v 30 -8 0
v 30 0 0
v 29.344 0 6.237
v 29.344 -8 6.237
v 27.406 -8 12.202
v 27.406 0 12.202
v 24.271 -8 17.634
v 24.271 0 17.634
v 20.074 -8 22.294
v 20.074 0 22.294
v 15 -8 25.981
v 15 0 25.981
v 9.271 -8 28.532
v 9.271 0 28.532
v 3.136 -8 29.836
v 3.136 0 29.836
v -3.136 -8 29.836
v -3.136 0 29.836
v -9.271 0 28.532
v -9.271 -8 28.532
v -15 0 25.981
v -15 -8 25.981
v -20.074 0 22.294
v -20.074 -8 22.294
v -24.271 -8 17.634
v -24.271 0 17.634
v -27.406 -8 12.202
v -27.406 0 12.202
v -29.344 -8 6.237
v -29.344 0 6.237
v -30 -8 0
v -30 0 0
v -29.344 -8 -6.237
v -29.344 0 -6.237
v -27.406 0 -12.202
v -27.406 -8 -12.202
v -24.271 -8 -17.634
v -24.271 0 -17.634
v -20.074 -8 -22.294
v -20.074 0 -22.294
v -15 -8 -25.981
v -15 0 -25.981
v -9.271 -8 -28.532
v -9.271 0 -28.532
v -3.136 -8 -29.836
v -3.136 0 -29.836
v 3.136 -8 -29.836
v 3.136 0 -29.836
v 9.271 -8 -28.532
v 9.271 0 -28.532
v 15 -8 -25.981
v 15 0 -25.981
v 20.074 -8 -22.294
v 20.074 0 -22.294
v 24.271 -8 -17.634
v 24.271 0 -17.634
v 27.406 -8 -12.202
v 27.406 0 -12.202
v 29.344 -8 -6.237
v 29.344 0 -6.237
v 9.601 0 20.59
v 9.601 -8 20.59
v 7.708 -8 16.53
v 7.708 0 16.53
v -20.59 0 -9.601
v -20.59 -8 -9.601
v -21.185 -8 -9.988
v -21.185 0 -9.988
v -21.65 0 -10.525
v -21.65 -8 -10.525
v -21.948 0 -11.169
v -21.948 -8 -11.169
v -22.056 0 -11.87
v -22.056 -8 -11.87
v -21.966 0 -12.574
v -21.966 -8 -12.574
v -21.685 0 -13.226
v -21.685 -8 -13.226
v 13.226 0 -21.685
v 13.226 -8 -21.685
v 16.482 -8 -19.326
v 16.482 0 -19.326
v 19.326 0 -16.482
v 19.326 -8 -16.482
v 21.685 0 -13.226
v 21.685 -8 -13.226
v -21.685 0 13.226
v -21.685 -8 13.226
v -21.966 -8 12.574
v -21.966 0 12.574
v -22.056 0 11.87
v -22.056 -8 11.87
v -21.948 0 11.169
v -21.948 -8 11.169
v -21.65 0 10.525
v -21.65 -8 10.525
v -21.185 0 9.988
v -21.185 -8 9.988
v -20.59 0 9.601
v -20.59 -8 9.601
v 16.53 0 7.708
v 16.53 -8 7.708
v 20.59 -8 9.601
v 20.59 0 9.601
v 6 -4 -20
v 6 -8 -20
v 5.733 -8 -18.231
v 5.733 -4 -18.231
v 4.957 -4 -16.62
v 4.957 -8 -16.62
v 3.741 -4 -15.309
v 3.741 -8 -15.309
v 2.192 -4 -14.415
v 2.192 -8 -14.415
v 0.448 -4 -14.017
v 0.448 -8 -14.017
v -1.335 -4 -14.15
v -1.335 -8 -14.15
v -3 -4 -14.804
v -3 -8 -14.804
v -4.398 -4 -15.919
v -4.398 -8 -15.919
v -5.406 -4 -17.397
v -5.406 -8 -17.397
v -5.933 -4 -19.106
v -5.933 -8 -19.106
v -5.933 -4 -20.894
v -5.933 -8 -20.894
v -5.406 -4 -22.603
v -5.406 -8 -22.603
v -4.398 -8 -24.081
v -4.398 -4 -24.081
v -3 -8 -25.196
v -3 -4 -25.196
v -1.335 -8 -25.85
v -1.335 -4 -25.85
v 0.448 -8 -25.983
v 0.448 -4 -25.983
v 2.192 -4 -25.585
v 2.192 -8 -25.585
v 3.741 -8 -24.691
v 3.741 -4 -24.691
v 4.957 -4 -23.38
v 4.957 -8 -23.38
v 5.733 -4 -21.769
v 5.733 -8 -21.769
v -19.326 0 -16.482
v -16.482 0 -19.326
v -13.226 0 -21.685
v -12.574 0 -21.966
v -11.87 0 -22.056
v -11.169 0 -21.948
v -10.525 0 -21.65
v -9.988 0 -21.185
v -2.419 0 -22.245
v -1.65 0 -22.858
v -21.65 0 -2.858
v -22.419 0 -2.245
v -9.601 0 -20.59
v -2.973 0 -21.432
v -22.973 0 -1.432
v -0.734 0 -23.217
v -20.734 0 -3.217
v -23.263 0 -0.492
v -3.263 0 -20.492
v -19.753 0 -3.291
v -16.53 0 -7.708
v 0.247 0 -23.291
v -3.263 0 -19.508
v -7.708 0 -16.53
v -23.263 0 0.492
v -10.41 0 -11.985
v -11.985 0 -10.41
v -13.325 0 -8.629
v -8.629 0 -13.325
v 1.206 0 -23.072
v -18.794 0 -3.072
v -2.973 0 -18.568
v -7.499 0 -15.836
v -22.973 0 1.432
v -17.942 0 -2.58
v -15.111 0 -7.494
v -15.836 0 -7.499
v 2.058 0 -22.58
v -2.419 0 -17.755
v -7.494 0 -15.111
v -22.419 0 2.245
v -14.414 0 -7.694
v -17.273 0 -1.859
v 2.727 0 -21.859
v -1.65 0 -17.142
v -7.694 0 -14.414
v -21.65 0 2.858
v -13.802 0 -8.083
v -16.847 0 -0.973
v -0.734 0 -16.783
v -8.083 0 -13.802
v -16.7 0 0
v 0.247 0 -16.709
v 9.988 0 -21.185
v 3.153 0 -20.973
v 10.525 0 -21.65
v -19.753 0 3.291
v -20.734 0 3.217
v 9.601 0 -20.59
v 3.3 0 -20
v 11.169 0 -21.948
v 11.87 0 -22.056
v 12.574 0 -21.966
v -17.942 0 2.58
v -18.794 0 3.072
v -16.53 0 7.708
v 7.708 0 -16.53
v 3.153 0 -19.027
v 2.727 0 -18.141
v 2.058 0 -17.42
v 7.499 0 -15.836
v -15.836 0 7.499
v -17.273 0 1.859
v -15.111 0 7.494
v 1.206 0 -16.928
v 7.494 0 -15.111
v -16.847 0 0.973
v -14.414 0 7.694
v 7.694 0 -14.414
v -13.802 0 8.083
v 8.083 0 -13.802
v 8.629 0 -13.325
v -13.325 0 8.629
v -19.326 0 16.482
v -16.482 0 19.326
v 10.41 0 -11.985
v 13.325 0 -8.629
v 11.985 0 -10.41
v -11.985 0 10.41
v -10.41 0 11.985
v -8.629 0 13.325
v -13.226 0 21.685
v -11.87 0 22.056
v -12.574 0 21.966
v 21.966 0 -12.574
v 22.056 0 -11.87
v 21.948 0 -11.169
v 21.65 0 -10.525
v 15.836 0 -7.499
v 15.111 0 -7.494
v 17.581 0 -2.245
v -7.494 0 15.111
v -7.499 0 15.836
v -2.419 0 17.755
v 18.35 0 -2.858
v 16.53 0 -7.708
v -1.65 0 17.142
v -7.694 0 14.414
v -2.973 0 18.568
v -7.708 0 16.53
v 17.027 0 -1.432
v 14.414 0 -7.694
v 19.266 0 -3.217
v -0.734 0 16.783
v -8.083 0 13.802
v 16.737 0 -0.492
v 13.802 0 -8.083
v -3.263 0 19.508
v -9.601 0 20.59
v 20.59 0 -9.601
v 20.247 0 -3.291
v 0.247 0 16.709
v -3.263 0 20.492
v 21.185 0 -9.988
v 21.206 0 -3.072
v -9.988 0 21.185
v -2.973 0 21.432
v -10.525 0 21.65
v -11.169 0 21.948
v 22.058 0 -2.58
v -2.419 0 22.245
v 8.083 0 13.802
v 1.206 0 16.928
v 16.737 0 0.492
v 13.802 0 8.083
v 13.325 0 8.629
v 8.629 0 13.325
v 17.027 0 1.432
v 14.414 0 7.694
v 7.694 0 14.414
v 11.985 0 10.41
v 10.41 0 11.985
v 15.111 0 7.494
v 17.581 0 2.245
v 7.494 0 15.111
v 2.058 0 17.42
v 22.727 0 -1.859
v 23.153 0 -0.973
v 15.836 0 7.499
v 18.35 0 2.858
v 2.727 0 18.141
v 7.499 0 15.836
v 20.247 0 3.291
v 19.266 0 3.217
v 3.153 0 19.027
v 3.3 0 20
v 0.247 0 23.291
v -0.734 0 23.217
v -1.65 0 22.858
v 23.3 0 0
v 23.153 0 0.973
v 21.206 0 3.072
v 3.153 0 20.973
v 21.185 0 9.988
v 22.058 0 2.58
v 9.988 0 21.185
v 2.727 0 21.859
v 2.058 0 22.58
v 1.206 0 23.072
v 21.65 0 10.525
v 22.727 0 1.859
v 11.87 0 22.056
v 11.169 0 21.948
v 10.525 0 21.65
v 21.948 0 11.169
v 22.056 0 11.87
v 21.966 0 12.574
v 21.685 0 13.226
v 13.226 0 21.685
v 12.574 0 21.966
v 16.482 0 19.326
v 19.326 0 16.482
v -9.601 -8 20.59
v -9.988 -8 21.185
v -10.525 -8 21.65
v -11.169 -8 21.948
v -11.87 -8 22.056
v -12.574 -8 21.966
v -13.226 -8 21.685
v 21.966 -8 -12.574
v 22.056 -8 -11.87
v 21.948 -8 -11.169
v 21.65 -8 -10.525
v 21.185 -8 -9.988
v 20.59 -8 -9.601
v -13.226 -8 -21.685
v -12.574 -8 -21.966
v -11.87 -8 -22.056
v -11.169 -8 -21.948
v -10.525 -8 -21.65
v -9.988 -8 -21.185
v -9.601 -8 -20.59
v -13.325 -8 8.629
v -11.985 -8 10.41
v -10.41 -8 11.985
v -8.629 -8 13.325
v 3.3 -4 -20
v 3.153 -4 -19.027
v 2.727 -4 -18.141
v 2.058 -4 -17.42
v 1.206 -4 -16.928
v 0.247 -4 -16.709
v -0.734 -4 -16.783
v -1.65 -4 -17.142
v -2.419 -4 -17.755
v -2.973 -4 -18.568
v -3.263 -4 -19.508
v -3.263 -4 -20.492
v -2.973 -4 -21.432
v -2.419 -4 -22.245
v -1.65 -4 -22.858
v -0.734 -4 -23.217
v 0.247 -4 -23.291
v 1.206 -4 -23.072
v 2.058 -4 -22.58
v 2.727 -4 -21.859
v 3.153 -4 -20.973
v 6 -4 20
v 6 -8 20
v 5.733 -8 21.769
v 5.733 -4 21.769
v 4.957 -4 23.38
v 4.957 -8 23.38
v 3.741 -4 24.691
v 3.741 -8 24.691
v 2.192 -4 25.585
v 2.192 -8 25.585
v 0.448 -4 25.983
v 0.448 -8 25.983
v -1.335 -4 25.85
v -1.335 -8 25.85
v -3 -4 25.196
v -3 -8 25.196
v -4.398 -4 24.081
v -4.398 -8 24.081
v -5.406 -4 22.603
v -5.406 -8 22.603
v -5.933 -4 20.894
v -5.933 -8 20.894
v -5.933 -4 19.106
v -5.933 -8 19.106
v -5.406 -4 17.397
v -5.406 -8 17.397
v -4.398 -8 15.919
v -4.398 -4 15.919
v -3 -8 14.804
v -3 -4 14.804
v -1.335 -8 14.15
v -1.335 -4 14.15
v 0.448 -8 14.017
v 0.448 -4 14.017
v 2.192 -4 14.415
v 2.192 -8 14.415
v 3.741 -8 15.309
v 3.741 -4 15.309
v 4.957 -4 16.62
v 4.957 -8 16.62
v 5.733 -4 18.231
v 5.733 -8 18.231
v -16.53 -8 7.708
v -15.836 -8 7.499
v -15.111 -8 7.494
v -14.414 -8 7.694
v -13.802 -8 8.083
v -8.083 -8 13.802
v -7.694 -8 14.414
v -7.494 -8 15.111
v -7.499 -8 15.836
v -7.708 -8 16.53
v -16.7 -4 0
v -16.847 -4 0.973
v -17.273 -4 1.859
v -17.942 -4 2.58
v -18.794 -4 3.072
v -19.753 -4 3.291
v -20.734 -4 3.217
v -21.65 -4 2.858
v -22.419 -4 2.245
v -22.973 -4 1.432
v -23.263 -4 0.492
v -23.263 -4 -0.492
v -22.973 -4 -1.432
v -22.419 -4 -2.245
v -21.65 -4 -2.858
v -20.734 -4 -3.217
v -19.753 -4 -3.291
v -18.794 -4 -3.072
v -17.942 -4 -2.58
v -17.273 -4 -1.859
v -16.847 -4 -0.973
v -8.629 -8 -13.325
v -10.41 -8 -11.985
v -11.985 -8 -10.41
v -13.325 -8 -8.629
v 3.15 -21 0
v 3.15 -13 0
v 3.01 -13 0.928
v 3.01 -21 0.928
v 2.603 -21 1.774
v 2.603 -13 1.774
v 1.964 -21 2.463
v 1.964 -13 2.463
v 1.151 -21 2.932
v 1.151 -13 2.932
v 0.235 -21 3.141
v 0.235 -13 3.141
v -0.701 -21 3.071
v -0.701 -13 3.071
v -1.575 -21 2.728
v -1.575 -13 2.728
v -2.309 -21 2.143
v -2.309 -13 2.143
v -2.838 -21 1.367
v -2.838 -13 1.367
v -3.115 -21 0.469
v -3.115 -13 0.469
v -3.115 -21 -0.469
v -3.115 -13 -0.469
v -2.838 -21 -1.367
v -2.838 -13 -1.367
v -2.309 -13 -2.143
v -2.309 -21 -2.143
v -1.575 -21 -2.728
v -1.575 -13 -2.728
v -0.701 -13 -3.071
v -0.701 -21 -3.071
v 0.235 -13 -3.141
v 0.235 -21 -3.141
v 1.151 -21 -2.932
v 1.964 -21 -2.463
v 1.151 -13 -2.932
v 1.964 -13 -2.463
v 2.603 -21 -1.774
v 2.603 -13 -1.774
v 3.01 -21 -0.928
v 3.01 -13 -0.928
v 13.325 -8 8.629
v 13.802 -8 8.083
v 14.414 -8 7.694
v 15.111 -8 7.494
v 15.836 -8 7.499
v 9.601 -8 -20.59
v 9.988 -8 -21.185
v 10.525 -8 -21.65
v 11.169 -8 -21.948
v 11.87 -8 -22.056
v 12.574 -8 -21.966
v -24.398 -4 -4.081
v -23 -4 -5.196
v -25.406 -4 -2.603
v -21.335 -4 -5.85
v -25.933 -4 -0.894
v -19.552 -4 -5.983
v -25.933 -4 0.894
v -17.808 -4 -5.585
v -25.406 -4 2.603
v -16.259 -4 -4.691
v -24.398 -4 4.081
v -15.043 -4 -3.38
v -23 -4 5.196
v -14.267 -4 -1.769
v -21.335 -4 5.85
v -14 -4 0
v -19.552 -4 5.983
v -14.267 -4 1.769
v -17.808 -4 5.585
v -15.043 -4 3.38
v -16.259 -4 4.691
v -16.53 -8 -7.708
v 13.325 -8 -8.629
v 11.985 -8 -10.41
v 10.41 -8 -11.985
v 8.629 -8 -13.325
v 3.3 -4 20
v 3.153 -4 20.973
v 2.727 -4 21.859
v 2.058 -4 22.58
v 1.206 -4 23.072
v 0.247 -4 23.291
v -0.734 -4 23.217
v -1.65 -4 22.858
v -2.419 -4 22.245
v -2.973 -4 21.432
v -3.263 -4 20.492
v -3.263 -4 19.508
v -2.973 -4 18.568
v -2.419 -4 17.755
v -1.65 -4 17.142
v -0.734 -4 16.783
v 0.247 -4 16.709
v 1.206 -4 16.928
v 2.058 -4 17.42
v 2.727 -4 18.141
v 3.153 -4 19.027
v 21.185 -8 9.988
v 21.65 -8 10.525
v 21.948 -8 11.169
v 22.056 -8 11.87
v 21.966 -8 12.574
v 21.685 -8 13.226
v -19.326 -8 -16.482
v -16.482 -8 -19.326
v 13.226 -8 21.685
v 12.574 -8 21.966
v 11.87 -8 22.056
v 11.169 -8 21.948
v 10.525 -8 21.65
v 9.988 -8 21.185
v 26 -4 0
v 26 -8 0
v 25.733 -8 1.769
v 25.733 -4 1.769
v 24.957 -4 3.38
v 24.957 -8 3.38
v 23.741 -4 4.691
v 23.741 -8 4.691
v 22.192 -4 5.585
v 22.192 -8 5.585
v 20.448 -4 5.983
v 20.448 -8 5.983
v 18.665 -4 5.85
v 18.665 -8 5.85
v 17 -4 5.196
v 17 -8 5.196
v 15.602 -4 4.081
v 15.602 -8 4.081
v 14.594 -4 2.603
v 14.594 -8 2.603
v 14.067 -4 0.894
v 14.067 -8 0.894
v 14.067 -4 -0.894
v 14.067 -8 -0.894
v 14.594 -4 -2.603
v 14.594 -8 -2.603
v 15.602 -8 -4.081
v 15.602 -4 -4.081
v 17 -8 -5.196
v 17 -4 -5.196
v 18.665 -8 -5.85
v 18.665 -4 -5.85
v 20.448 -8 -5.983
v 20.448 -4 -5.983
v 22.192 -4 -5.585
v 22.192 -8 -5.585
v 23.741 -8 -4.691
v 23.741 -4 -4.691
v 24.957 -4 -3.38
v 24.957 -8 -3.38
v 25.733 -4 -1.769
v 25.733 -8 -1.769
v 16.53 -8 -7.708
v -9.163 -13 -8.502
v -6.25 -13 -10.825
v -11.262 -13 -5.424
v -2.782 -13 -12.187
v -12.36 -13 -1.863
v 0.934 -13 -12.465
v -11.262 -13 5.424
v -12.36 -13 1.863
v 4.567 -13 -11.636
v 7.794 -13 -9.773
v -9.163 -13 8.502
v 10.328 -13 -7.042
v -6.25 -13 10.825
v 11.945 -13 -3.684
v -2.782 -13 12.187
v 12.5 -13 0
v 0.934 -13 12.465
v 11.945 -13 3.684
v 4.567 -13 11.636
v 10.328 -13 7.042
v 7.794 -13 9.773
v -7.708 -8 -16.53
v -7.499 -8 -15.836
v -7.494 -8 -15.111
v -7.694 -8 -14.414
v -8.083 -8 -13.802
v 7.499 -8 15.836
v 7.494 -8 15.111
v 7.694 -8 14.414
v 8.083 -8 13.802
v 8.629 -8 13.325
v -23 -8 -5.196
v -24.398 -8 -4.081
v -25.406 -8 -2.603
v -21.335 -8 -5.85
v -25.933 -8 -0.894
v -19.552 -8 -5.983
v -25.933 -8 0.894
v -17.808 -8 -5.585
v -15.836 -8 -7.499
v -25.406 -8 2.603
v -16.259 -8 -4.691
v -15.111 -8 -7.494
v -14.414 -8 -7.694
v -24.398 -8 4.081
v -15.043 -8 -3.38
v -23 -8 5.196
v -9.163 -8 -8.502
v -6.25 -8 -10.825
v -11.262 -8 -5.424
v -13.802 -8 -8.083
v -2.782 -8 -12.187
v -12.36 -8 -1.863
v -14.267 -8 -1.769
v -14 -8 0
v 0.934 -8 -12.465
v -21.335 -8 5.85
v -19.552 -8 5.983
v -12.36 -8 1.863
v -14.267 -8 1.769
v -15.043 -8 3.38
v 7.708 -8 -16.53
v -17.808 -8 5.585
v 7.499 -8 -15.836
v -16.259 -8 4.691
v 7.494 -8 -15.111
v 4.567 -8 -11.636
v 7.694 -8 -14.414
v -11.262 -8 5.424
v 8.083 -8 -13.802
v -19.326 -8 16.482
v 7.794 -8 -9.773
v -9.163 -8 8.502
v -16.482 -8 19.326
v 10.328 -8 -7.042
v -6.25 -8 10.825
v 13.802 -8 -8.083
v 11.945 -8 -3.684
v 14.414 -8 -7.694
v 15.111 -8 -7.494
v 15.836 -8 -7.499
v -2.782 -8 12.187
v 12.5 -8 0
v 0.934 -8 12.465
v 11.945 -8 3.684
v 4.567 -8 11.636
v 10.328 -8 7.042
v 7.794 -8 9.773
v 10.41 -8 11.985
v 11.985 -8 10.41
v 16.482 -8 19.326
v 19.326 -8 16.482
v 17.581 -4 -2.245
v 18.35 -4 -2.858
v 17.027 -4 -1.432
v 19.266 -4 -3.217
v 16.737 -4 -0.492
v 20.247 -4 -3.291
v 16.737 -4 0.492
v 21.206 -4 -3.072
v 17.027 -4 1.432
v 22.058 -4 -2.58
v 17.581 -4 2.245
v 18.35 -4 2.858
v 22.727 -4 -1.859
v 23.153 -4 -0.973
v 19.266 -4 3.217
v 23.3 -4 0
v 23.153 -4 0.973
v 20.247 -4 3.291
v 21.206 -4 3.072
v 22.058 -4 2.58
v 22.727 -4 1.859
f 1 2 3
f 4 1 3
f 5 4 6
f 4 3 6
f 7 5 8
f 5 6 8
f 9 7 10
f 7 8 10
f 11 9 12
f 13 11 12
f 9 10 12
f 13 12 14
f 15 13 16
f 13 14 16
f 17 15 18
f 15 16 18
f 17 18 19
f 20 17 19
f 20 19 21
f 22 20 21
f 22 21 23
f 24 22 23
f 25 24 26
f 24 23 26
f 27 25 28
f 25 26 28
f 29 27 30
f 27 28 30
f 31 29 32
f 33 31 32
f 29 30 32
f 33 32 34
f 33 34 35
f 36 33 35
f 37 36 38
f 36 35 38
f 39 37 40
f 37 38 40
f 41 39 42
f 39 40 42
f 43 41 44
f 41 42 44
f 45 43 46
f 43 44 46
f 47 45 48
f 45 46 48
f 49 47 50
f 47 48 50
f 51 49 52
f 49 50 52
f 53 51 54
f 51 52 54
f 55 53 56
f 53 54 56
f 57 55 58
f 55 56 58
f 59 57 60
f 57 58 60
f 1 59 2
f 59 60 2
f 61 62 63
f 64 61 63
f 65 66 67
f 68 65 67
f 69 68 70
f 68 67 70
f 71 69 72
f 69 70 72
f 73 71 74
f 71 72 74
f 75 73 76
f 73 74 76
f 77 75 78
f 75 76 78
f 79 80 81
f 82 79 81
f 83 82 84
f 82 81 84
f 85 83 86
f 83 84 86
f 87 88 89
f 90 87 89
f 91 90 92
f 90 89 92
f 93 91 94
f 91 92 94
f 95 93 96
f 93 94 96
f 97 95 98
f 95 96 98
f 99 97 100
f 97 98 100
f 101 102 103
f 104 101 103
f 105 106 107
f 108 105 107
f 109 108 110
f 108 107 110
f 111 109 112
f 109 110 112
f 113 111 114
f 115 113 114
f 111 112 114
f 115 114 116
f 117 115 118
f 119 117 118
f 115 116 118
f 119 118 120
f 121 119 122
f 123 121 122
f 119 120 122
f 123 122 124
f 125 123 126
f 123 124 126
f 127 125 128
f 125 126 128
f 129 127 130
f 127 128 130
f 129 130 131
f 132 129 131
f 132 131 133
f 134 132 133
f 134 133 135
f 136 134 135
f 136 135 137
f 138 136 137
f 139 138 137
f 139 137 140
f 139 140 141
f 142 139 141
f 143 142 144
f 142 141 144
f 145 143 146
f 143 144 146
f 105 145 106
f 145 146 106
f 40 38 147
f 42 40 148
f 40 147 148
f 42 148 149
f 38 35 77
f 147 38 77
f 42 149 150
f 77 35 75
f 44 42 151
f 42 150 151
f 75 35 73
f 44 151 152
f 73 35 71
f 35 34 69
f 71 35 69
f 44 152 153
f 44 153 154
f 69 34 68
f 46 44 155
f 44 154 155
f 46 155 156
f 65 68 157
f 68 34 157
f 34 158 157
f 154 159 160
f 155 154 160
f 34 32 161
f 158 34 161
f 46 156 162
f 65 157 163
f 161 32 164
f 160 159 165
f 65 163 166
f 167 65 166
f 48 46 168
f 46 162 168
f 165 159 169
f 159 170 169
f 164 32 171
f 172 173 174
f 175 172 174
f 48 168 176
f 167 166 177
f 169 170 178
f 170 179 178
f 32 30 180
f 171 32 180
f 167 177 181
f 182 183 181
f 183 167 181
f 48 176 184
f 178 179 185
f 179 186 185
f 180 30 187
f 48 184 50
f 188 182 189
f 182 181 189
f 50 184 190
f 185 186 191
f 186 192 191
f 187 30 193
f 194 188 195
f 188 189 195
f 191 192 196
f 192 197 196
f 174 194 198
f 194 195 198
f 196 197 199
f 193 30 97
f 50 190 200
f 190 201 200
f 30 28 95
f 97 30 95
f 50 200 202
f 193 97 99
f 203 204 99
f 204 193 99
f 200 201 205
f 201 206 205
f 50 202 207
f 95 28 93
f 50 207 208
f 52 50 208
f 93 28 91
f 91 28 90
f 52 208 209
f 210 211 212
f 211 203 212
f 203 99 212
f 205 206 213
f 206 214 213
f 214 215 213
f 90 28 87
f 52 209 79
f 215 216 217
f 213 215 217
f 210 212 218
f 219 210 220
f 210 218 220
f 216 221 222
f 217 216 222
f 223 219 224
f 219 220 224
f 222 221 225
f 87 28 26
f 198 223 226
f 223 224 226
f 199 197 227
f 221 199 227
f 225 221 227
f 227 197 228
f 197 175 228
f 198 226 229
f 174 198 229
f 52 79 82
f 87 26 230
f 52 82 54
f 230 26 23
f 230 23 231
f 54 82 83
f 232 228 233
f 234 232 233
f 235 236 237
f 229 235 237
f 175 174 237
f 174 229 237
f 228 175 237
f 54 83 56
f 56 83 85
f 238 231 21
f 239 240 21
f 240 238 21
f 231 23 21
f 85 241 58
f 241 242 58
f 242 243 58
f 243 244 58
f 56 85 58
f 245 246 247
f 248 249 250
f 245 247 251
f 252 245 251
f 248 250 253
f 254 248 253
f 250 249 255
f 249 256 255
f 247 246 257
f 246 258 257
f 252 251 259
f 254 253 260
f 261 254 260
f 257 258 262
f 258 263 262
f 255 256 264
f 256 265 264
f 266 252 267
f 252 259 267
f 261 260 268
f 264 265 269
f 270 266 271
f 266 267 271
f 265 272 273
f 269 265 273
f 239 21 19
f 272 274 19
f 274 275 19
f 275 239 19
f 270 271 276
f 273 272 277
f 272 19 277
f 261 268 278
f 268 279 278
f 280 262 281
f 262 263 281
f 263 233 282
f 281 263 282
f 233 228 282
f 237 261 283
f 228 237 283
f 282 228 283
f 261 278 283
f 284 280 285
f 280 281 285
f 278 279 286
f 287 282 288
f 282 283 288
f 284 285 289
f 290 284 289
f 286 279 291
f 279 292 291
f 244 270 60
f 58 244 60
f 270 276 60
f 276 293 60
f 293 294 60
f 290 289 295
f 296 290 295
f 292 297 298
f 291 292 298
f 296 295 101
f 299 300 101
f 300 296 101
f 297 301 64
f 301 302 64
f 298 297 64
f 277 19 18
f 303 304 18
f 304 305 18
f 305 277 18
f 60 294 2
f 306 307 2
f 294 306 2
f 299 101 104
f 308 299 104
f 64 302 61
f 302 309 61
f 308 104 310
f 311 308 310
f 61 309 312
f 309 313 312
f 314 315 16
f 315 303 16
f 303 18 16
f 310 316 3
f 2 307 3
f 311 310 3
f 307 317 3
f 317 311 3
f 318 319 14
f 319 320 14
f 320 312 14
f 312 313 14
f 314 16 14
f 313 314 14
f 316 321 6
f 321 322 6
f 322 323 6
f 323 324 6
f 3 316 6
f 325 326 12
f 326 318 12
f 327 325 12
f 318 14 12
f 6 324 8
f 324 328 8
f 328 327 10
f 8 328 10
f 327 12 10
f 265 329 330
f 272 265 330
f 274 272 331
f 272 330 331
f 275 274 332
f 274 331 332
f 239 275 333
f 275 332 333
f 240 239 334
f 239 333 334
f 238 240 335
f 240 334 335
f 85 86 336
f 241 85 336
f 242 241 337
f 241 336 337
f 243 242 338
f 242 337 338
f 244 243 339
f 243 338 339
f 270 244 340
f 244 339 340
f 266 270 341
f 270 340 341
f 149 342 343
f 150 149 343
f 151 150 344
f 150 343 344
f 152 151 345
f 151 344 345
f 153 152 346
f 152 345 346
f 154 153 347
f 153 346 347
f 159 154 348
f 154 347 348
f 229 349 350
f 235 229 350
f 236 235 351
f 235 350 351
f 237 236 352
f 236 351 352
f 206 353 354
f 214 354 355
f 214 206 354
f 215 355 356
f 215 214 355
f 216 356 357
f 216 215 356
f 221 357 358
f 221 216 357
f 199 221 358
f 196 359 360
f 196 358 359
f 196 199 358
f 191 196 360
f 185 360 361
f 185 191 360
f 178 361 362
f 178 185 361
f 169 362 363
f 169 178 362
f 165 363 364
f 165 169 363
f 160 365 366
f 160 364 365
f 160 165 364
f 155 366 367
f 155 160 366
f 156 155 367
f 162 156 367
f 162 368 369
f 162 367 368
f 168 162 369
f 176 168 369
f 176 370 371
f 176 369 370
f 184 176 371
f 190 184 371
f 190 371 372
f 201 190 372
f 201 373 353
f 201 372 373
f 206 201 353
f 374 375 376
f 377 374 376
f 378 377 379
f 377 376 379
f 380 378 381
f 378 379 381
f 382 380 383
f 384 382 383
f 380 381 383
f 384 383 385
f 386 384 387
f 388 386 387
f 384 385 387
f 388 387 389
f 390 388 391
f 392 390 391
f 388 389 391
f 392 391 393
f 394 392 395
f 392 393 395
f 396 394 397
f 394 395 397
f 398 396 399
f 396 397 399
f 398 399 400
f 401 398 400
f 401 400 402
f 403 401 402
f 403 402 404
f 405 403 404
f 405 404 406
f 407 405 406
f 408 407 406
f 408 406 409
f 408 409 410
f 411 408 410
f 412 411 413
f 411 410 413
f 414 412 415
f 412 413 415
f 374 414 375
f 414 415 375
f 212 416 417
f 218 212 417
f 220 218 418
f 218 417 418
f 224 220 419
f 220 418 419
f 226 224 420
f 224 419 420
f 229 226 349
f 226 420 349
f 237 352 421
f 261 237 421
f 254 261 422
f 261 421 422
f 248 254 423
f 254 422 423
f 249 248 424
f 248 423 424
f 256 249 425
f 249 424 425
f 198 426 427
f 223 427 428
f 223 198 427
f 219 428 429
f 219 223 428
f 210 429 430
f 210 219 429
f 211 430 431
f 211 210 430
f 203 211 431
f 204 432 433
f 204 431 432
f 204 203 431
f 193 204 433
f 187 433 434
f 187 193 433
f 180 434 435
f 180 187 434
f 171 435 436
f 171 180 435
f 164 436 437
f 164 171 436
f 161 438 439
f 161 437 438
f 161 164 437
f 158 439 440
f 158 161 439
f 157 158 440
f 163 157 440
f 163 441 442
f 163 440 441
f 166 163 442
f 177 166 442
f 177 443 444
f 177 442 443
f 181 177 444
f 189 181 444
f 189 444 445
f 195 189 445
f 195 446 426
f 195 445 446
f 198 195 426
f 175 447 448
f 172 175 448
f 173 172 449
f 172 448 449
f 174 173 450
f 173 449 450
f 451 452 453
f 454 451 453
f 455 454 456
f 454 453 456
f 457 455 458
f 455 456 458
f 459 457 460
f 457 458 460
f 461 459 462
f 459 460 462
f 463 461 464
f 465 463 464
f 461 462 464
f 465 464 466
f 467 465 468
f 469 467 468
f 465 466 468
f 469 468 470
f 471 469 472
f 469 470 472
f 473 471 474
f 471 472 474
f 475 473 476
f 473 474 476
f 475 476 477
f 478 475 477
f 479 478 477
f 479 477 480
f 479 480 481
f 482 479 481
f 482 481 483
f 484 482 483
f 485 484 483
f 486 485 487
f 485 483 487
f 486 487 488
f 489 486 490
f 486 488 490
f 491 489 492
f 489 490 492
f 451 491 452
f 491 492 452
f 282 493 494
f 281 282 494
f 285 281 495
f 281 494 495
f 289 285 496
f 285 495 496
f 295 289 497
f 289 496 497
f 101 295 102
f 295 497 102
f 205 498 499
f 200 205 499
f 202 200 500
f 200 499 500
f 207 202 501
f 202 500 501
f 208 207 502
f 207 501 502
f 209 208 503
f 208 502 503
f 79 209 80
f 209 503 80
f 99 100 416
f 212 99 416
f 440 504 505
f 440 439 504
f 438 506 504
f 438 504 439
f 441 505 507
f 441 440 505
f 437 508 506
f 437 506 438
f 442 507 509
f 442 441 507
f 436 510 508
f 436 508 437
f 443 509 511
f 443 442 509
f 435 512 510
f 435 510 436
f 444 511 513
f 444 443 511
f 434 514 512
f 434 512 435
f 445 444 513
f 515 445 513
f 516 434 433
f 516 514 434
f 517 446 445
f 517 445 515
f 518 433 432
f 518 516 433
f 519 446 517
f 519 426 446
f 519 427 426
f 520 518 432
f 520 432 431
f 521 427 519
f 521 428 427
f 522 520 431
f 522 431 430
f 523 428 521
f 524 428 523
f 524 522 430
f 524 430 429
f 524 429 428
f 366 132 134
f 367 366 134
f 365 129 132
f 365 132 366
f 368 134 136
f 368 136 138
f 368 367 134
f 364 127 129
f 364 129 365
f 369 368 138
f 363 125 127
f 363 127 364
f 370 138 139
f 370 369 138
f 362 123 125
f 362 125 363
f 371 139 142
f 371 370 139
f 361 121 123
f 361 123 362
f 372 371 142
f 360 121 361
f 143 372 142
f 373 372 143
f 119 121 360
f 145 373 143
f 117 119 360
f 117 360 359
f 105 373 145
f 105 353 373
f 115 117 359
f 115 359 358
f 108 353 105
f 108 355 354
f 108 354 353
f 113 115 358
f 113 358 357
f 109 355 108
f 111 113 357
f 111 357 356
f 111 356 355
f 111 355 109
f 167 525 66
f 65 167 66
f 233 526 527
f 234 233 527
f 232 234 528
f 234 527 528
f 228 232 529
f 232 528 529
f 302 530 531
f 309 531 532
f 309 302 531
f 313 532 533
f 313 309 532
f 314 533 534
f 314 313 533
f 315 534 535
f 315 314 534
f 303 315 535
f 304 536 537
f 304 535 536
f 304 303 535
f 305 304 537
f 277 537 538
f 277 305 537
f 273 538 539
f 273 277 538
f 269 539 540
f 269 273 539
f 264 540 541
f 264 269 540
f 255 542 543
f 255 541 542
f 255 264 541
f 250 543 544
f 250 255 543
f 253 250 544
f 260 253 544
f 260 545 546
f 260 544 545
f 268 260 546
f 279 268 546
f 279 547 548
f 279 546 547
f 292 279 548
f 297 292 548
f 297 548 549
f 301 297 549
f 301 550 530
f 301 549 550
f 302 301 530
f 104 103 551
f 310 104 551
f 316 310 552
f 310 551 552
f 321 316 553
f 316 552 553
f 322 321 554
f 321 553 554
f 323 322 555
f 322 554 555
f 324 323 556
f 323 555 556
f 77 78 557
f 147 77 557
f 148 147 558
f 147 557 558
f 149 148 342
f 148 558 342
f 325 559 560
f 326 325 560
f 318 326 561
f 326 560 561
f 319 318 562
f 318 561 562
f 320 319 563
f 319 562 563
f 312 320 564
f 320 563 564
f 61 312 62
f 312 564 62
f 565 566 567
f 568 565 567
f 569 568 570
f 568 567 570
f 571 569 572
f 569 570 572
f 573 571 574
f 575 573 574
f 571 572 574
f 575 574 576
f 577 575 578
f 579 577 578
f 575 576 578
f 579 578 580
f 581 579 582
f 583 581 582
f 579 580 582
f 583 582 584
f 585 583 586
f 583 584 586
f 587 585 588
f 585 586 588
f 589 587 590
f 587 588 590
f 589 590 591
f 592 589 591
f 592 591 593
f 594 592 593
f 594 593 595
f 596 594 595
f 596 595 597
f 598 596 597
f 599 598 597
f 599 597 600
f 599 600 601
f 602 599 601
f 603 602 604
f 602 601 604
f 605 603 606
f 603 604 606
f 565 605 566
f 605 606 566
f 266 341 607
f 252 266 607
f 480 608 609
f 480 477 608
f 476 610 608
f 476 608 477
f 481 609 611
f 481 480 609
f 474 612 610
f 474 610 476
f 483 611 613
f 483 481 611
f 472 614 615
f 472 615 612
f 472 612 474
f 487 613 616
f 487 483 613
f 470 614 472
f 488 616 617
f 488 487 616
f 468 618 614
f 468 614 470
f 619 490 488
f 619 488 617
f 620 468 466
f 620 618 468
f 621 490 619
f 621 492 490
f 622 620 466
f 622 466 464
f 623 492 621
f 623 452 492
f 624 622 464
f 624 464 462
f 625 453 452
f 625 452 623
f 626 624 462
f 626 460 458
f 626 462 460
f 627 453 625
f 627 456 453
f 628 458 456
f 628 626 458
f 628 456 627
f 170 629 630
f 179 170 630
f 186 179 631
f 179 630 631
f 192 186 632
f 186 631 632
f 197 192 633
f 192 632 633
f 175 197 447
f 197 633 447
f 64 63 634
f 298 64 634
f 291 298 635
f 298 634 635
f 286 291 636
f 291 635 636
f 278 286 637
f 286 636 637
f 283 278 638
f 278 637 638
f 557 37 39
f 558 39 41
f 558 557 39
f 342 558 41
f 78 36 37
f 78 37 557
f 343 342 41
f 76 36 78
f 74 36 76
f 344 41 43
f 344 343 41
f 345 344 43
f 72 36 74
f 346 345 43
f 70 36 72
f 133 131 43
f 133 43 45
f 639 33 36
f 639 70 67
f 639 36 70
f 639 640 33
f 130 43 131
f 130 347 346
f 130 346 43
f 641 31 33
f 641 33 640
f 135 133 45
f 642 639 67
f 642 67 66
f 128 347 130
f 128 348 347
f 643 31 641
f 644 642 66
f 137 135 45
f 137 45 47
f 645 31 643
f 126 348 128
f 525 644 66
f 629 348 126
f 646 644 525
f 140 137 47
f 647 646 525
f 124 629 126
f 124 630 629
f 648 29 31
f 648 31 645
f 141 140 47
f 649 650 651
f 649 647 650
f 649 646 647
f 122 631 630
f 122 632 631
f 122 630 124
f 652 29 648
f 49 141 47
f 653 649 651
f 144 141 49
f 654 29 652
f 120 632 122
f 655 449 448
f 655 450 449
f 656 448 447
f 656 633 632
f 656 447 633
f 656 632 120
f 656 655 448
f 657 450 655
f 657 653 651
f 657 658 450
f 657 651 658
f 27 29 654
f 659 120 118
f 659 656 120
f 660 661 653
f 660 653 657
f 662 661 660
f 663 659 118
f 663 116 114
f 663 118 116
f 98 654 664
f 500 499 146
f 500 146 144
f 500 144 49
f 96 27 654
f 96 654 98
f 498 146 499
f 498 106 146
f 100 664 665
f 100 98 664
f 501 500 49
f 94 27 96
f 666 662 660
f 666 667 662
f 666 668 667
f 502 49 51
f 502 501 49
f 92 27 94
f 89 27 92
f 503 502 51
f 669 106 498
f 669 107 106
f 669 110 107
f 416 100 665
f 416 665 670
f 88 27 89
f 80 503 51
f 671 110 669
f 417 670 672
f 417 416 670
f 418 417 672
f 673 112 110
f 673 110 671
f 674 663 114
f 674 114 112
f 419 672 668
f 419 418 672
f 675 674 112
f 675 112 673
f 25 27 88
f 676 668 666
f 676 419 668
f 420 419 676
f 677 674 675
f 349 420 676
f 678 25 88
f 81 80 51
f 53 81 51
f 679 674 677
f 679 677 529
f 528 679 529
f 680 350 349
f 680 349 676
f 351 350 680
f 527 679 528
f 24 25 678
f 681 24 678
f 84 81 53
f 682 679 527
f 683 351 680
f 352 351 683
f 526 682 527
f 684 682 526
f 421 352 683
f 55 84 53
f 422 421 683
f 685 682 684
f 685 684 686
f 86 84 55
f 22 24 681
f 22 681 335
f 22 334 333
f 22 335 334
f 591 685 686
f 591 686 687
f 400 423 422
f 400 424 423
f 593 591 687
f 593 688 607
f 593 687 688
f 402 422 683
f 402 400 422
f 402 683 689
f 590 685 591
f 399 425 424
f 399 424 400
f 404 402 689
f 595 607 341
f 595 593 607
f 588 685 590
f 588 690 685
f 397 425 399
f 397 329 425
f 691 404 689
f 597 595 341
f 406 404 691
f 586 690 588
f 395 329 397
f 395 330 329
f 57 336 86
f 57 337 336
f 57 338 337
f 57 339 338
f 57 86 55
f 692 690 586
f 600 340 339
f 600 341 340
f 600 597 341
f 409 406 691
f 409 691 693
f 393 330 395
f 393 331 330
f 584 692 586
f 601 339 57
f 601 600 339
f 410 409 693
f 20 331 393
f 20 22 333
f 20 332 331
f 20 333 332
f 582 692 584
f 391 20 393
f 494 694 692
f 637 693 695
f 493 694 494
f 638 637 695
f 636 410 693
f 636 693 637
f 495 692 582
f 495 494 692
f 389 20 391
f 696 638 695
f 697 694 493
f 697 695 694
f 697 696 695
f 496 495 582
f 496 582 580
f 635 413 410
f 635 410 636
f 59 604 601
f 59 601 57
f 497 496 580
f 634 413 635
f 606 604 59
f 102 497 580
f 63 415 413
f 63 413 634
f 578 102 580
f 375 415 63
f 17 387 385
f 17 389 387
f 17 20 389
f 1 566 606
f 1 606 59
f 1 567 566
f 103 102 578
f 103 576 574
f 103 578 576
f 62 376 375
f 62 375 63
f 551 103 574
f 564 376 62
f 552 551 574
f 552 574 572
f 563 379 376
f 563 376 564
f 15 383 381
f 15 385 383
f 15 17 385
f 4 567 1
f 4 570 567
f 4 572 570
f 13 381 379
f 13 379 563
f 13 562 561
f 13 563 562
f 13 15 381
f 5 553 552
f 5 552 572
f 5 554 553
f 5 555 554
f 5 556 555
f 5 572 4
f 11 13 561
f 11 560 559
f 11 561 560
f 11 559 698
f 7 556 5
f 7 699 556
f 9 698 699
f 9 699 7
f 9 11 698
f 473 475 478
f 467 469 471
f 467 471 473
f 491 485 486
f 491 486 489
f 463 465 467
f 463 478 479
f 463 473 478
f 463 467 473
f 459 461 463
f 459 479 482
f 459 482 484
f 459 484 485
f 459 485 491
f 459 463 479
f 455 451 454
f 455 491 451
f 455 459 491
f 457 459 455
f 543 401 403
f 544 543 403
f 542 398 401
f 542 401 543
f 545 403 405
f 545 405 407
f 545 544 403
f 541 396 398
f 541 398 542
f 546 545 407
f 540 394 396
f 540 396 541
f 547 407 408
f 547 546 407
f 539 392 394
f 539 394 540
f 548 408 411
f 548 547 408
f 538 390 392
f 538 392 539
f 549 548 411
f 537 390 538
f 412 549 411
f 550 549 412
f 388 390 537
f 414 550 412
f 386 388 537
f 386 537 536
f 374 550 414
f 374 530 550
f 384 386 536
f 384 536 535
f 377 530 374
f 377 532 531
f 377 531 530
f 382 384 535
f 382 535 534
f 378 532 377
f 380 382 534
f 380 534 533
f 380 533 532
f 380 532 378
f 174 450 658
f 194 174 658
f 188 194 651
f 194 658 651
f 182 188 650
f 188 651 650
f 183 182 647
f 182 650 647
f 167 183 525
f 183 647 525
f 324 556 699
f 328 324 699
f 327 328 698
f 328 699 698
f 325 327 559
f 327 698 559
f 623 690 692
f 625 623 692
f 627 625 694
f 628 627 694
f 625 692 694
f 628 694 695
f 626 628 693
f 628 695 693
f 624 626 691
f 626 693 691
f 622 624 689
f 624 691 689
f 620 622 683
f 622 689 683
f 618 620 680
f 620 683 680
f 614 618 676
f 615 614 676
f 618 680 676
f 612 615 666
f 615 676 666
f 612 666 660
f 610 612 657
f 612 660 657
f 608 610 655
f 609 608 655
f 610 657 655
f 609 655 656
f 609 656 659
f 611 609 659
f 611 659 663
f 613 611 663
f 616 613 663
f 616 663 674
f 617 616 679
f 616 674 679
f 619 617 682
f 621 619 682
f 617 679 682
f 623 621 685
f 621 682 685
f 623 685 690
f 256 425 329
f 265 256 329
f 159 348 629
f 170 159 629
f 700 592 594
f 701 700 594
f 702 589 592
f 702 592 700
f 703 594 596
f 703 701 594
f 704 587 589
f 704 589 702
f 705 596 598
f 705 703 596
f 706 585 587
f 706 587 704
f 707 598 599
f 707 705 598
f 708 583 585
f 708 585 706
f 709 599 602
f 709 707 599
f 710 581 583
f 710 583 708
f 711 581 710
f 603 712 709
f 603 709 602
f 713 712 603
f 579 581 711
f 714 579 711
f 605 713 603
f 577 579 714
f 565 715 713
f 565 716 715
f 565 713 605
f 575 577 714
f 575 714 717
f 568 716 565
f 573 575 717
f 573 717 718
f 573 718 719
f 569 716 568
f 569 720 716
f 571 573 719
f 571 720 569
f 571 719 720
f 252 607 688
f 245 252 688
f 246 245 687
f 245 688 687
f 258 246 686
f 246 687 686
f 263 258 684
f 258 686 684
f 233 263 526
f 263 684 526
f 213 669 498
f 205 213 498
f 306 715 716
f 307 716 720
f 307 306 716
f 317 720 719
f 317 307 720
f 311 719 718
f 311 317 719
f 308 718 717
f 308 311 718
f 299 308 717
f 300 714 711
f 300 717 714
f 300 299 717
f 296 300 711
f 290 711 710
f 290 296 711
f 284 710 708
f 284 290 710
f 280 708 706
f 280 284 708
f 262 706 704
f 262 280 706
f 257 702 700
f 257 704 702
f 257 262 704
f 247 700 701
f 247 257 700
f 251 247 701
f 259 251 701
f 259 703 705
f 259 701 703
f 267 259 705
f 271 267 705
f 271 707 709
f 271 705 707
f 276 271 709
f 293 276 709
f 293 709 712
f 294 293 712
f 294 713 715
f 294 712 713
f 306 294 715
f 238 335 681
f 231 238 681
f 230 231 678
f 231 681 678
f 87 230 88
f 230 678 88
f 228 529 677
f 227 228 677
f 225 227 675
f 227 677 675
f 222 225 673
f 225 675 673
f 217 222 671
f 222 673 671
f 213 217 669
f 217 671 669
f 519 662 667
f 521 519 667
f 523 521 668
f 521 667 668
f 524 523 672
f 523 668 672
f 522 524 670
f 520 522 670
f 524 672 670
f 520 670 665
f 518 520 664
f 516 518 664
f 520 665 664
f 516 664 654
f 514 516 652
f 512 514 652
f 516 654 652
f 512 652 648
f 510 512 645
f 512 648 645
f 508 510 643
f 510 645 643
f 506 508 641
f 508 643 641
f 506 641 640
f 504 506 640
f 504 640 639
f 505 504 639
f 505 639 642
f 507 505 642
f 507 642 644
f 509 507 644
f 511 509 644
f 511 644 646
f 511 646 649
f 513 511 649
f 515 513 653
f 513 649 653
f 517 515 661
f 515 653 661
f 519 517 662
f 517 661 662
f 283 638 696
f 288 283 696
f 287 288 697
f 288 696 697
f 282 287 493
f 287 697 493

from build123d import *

# Parameters (mm, degrees)
F0_R     = 30
F0_R_2   = 3.3
F1_DEPTH = 8
F2_R     = 6
F3_DEPTH = 4
F4_R     = 12.5
F5_DEPTH = 5
F6_R     = 3.15
F7_DEPTH = 8
F9_DEPTH = 25.4


with BuildPart() as f1:
    # F0 (on Front) → F1 (new body)
    with BuildSketch(Plane.XZ):
        Circle(F0_R)
        with Locations((0, -20)):
            Circle(F0_R_2, mode=Mode.SUBTRACT)
        with Locations((-20, 0)):
            Circle(F0_R_2, mode=Mode.SUBTRACT)
        with Locations((20, 0)):
            Circle(F0_R_2, mode=Mode.SUBTRACT)
        with Locations((0, 20)):
            Circle(F0_R_2, mode=Mode.SUBTRACT)
    extrude(amount=F1_DEPTH)

    # F2 (on face) → F3 (cut)
    with BuildSketch(Plane.XZ.offset(8)):
        with Locations((0, 20)):
            Circle(F2_R)
        with Locations((-20, 0)):
            Circle(F2_R)
        with Locations((20, 0)):
            Circle(F2_R)
        with Locations((0, -20)):
            Circle(F2_R)
    extrude(amount=-F3_DEPTH, mode=Mode.SUBTRACT)

    # F4 (on face) → F5 (join)
    with BuildSketch(Plane.XZ.offset(8)):
        Circle(F4_R)
    extrude(amount=F5_DEPTH)

    # F6 (on face) → F7 (join)
    with BuildSketch(Plane.XZ.offset(13)):
        Circle(F6_R)
    extrude(amount=F7_DEPTH)

    # F8 (on face) → F9 (cut)
    with BuildSketch(Plane.XZ.offset(8)):
        with BuildLine():
            ThreePointArc((-13.324728, 8.62944), (-11.22532, 11.22532), (-8.62944, 13.324728))
            ThreePointArc((-8.62944, 13.324728), (-7.568985, 14.755035), (-7.708129, 16.530135))
            Line((-7.708129, 16.530135), (-9.601232, 20.589909))
            ThreePointArc((-9.601232, 20.589909), (-11.168675, 21.947918), (-13.225838, 21.684954))
            ThreePointArc((-13.225838, 21.684954), (-17.960512, 17.960512), (-21.684954, 13.225838))
            ThreePointArc((-21.684954, 13.225838), (-21.947918, 11.168675), (-20.589909, 9.601232))
            Line((-20.589909, 9.601232), (-16.530135, 7.708129))
            ThreePointArc((-16.530135, 7.708129), (-14.755035, 7.568985), (-13.324728, 8.62944))
        make_face()
        with BuildLine():
            ThreePointArc((-20.589909, -9.601232), (-21.947918, -11.168675), (-21.684954, -13.225838))
            ThreePointArc((-21.684954, -13.225838), (-17.960512, -17.960512), (-13.225838, -21.684954))
            ThreePointArc((-13.225838, -21.684954), (-11.168675, -21.947918), (-9.601232, -20.589909))
            Line((-9.601232, -20.589909), (-7.708129, -16.530135))
            ThreePointArc((-7.708129, -16.530135), (-7.568985, -14.755035), (-8.62944, -13.324728))
            ThreePointArc((-8.62944, -13.324728), (-11.22532, -11.22532), (-13.324728, -8.62944))
            ThreePointArc((-13.324728, -8.62944), (-14.755035, -7.568985), (-16.530135, -7.708129))
            Line((-16.530135, -7.708129), (-20.589909, -9.601232))
        make_face()
        with BuildLine():
            ThreePointArc((9.601232, -20.589909), (11.168675, -21.947918), (13.225838, -21.684954))
            ThreePointArc((13.225838, -21.684954), (17.960512, -17.960512), (21.684954, -13.225838))
            ThreePointArc((21.684954, -13.225838), (21.947918, -11.168675), (20.589909, -9.601232))
            Line((20.589909, -9.601232), (16.530135, -7.708129))
            ThreePointArc((16.530135, -7.708129), (14.755035, -7.568985), (13.324728, -8.62944))
            ThreePointArc((13.324728, -8.62944), (11.22532, -11.22532), (8.62944, -13.324728))
            ThreePointArc((8.62944, -13.324728), (7.568985, -14.755035), (7.708129, -16.530135))
            Line((7.708129, -16.530135), (9.601232, -20.589909))
        make_face()
        with BuildLine():
            ThreePointArc((20.589909, 9.601232), (21.947918, 11.168675), (21.684954, 13.225838))
            ThreePointArc((21.684954, 13.225838), (17.960512, 17.960512), (13.225838, 21.684954))
            ThreePointArc((13.225838, 21.684954), (11.168675, 21.947918), (9.601232, 20.589909))
            Line((9.601232, 20.589909), (7.708129, 16.530135))
            ThreePointArc((7.708129, 16.530135), (7.568985, 14.755035), (8.62944, 13.324728))
            ThreePointArc((8.62944, 13.324728), (11.22532, 11.22532), (13.324728, 8.62944))
            ThreePointArc((13.324728, 8.62944), (14.755035, 7.568985), (16.530135, 7.708129))
            Line((16.530135, 7.708129), (20.589909, 9.601232))
        make_face()
    extrude(amount=-F9_DEPTH, mode=Mode.SUBTRACT)


solid = f1.part
